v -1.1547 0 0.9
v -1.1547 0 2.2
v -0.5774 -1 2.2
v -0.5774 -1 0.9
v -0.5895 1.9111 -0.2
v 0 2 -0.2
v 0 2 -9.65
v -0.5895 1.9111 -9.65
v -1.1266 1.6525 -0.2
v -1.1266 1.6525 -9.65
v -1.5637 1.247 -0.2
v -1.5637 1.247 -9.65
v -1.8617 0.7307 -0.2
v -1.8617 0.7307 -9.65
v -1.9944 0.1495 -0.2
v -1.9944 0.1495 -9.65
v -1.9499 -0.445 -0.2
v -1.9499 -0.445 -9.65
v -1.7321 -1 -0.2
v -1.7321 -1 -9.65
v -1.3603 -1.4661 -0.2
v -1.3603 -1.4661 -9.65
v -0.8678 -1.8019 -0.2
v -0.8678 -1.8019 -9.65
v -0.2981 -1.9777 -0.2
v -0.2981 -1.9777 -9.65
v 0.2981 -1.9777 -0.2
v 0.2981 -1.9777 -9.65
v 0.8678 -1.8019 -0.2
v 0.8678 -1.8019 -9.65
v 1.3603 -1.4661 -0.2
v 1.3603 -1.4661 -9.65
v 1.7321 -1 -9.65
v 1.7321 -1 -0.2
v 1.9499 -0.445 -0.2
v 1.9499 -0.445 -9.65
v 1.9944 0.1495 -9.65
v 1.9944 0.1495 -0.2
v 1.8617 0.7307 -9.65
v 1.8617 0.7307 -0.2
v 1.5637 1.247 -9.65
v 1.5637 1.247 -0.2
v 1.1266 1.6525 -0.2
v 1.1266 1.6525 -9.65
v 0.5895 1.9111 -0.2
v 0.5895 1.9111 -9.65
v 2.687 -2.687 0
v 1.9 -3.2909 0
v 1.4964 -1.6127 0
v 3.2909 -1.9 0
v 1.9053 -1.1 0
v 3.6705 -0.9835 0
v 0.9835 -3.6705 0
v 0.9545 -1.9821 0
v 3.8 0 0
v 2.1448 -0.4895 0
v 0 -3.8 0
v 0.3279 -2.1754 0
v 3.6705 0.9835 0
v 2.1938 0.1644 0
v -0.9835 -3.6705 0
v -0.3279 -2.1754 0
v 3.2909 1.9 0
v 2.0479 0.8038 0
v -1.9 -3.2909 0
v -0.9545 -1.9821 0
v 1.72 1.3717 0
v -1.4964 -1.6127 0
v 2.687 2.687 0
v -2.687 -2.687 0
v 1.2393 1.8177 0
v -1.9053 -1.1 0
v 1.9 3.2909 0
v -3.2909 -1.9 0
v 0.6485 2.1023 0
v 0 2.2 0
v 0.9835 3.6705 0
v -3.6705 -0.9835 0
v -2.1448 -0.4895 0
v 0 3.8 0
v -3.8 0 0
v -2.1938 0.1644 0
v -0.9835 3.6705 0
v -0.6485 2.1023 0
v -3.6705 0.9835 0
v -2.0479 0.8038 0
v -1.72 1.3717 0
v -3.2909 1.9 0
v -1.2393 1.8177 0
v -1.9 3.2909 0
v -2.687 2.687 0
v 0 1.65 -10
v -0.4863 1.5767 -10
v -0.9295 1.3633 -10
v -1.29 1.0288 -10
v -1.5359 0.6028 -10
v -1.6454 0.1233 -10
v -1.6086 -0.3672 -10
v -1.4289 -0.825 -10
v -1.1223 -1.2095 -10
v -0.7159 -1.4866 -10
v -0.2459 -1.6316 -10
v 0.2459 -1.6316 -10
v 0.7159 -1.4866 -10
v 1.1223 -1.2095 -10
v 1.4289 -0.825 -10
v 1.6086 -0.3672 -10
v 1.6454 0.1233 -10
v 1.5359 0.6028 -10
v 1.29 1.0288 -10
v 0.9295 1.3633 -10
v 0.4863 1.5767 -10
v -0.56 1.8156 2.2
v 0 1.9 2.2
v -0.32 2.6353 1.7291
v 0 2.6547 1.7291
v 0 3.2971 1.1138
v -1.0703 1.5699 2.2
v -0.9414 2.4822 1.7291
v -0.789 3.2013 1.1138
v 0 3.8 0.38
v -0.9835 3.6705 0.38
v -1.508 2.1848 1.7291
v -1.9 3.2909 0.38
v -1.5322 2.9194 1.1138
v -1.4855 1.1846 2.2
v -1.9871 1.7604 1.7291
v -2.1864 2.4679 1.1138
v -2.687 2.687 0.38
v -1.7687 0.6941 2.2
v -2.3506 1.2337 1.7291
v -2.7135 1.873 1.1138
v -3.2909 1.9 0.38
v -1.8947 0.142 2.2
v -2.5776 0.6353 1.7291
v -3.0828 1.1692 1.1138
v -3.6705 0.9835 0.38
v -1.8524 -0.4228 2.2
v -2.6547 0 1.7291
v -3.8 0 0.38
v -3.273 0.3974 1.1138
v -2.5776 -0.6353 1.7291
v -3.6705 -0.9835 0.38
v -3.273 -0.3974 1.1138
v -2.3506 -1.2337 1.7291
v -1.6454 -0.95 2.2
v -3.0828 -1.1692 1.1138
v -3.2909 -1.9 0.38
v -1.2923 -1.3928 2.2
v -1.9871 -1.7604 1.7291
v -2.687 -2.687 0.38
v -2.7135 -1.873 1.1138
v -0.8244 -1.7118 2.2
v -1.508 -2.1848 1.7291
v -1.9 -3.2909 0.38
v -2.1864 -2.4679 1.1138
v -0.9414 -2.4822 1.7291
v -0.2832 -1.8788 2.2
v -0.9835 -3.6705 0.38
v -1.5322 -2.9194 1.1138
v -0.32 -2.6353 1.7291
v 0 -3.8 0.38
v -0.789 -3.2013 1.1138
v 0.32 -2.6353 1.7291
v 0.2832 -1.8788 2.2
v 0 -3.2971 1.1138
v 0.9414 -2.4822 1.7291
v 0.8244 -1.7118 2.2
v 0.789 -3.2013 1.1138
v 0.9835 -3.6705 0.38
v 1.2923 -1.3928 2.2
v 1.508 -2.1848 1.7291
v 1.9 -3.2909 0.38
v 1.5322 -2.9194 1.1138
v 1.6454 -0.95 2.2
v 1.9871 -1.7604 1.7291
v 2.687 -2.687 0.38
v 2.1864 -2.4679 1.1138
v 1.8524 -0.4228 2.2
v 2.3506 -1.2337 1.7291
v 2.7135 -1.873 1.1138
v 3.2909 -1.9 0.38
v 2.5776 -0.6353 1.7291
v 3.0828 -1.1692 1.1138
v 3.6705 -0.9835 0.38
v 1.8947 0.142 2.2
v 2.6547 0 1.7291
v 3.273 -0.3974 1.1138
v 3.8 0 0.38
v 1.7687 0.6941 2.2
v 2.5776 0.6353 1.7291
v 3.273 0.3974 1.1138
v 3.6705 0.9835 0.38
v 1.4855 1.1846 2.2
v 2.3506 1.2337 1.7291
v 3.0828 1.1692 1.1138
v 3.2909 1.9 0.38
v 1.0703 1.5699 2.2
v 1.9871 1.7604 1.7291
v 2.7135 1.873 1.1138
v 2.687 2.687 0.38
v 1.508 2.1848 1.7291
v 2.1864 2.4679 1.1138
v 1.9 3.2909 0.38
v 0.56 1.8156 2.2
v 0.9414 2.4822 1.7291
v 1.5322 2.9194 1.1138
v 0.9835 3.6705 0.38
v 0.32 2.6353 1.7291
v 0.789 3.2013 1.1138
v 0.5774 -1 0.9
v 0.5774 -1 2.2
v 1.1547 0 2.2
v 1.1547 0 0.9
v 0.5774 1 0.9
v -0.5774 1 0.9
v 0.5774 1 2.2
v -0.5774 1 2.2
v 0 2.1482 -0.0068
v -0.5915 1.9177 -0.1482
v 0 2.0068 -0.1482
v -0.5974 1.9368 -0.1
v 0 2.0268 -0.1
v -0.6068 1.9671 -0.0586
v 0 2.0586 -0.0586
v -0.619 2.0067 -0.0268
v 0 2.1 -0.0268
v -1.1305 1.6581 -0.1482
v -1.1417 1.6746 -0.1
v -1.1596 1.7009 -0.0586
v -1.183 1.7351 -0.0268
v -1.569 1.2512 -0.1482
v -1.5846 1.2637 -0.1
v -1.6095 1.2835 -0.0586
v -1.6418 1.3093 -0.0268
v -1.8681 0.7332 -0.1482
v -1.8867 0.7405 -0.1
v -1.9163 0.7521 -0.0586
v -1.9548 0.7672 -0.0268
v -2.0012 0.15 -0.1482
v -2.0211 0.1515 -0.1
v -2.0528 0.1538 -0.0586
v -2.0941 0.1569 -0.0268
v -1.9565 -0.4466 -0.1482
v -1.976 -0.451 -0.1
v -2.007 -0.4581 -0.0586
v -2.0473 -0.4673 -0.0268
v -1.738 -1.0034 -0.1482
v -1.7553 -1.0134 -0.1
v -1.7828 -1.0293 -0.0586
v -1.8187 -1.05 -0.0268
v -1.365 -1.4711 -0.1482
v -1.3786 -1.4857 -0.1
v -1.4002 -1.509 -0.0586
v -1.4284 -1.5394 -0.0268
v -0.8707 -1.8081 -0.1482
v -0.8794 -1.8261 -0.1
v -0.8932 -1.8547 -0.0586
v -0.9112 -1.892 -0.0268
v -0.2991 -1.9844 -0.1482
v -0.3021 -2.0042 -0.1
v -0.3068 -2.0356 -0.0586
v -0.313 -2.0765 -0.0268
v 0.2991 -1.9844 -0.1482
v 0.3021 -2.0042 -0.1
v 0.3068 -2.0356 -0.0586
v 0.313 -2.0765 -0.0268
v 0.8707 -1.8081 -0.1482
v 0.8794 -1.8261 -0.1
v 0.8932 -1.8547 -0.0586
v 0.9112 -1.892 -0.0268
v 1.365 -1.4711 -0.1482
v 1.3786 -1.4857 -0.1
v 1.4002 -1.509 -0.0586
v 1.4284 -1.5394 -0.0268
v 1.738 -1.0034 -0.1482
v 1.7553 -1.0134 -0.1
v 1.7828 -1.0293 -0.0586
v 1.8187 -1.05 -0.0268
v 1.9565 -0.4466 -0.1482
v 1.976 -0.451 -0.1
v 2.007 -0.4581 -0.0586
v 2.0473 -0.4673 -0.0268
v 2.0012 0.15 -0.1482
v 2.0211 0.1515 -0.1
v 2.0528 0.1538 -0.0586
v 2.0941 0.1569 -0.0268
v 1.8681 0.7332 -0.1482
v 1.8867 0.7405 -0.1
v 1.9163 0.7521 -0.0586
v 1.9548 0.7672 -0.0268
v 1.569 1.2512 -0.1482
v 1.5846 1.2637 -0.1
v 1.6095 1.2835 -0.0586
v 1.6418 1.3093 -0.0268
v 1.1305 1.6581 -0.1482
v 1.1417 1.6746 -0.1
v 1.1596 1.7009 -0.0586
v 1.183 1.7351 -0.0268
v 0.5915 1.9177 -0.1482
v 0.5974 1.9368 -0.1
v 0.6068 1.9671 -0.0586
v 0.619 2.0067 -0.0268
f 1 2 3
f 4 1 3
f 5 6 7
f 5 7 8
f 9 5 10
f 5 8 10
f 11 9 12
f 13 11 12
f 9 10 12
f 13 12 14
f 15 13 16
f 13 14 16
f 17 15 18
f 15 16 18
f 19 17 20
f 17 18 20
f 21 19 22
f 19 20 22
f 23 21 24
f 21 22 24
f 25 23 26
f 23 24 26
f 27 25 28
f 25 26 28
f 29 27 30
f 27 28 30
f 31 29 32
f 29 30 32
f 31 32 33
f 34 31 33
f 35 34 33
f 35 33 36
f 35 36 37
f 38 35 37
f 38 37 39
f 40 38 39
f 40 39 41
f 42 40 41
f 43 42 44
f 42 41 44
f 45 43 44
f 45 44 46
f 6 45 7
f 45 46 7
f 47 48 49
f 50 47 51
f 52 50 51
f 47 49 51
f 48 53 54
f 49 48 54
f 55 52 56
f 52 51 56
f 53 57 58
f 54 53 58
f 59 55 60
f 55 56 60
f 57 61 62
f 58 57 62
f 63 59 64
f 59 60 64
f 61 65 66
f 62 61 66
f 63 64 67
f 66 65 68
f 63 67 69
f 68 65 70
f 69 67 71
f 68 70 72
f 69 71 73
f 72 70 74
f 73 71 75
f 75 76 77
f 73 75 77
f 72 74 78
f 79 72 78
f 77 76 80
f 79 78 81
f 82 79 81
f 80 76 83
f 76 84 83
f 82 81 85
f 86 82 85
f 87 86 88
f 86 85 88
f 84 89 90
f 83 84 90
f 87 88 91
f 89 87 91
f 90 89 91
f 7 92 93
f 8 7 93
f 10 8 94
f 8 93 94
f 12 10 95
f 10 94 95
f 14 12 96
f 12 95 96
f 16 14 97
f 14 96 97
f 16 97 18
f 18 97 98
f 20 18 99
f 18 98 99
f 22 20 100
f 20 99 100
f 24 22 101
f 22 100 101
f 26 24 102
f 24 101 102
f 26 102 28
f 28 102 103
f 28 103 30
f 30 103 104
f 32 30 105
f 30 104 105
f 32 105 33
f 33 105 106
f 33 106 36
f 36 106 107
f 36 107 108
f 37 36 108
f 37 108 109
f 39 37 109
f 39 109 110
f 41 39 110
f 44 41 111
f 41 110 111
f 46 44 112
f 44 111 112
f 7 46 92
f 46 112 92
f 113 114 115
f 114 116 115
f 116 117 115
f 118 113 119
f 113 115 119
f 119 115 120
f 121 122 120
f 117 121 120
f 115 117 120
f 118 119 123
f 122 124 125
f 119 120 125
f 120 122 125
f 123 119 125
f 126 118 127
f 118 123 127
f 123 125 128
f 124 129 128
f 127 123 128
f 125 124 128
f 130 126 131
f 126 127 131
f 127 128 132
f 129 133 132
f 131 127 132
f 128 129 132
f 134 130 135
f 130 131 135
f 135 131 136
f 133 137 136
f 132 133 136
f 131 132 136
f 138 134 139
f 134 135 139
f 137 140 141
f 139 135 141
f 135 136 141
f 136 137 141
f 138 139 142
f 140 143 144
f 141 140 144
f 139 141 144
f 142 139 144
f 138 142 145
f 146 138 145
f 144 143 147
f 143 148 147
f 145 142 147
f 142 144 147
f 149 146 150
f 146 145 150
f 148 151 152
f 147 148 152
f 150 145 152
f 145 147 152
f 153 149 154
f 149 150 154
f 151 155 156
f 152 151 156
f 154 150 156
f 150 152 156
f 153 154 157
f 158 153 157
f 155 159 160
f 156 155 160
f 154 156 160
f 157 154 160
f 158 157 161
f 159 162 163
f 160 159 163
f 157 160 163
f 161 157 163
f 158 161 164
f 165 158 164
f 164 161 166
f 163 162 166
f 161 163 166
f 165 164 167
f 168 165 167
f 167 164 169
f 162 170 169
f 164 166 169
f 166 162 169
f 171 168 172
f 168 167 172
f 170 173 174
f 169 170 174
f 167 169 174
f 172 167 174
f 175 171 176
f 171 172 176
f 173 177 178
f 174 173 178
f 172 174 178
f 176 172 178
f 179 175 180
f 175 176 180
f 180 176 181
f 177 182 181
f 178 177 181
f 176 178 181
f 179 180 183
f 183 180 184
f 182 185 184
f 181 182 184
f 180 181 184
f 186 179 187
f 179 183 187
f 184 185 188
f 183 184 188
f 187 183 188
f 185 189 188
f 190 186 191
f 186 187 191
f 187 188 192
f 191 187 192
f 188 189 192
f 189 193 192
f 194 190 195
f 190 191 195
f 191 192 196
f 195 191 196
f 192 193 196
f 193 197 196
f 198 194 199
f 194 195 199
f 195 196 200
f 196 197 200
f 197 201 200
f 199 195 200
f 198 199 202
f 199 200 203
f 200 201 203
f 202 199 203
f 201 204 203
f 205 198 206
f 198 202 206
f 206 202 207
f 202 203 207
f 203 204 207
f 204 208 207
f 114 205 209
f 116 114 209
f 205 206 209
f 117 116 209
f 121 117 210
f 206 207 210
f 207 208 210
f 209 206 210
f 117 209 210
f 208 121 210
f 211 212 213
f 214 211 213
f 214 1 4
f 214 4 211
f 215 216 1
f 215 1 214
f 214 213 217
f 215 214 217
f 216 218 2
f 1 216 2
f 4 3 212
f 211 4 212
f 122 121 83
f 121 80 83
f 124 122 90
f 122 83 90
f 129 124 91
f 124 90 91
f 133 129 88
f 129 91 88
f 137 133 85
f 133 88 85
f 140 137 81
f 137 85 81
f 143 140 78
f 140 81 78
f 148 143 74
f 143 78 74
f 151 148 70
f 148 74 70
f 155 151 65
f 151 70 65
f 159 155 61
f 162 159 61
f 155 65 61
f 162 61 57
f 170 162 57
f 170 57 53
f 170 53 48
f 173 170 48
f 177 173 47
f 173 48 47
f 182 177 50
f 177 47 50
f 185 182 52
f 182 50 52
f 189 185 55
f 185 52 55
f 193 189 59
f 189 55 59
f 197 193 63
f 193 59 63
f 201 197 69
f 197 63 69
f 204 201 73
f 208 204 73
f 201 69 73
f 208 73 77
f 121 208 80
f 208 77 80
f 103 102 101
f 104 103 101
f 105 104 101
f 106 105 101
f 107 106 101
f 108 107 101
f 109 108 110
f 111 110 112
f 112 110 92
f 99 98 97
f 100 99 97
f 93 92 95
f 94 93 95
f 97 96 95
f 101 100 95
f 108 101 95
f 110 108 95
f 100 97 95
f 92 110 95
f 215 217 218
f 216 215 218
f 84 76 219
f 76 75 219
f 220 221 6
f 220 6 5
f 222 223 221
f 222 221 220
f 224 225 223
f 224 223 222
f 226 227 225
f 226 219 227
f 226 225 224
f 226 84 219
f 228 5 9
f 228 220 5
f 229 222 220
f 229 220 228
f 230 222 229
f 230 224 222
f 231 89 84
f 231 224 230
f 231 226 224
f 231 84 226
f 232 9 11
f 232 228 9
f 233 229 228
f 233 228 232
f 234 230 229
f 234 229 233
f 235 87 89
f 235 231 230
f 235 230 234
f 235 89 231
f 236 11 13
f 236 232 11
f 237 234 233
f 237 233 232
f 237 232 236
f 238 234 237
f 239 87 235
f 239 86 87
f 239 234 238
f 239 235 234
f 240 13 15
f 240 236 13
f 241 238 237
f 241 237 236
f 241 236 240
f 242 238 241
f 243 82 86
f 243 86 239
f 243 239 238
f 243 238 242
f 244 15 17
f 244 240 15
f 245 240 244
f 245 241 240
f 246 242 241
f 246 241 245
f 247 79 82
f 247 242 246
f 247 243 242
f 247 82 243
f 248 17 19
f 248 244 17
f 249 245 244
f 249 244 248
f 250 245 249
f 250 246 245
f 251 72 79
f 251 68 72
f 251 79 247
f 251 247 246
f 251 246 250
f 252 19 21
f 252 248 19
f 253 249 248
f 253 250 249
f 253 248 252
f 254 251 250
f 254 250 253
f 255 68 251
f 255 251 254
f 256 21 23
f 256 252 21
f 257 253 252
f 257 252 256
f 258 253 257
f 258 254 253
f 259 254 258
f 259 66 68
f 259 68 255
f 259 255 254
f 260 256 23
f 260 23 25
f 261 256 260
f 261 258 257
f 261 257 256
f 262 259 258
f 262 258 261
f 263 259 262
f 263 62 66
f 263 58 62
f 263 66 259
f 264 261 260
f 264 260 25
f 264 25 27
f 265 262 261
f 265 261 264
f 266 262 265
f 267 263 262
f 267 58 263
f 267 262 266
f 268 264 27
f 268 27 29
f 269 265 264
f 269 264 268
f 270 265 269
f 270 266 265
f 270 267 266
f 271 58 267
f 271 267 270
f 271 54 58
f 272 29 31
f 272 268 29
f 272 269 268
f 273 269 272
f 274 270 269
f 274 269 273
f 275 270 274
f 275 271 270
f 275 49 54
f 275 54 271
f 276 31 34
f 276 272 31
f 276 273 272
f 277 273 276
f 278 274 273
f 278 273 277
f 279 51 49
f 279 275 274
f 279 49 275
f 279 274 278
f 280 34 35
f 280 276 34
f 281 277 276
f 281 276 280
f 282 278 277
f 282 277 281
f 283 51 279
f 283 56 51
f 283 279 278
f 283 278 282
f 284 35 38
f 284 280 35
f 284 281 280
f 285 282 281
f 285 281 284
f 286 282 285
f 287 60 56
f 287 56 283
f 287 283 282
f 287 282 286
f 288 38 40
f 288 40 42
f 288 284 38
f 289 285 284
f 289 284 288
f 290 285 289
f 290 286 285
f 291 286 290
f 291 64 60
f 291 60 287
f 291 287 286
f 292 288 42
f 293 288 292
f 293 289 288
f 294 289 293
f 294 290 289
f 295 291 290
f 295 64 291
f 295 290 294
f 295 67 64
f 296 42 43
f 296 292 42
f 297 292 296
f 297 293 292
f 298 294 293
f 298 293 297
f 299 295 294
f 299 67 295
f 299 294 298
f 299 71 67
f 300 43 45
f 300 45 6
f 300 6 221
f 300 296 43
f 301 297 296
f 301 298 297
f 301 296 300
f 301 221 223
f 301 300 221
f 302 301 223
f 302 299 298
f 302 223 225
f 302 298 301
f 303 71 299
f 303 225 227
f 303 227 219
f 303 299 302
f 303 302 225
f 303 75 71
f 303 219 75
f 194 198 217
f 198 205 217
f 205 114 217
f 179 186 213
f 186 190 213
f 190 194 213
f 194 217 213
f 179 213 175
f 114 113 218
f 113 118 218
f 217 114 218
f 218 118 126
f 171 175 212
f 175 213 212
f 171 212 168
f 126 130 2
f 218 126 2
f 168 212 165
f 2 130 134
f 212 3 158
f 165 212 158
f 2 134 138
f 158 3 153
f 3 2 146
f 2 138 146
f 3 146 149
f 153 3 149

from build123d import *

# Parameters (mm, degrees)
CUT_EXTRUDE1_DEPTH = 1.3
CHAMFER1_SIZE      = 0.35
FILLET1_R          = 0.2


with BuildPart() as part:
    # Sketch1 → Revolve1 (revolve)
    with BuildSketch(Plane(origin=(0, 0, 0), x_dir=(0, 0, -1), z_dir=(1, 0, 0))):
        with BuildLine():
            Line((-0.38, 3.8), (0, 3.8))
            Line((0, 3.8), (0, 2))
            Line((0, 2), (10, 2))
            Line((10, 2), (10, 0))
            Line((10, 0), (-2.2, 0))
            Line((-2.2, 0), (-2.2, 1.9))
            ThreePointArc((-2.2, 1.9), (-1.437986341, 2.991755338), (-0.38, 3.8))
        make_face()
    revolve(axis=Axis((0, 0, -10), (0, 0, 1)))

    # Sketch2 → Cut-Extrude1 (cut)
    with BuildSketch(Plane.XY.offset(2.2)):
        Polygon((1.154700538, 0), (0.577350269, 1), (-0.577350269, 1), (-1.154700538, 0), (-0.577350269, -1), (0.577350269, -1), align=None)
    extrude(amount=-CUT_EXTRUDE1_DEPTH, mode=Mode.SUBTRACT)

    # Chamfer1
    chamfer1_edges = [part.edges().sort_by_distance(p)[0] for p in [
        (0, -2, -10),
    ]]
    chamfer(chamfer1_edges, length=CHAMFER1_SIZE)

    # Fillet1
    fillet1_edges = [part.edges().sort_by_distance(p)[0] for p in [
        (0, -2, 0),
    ]]
    fillet(fillet1_edges, radius=FILLET1_R)


solid = part.part
